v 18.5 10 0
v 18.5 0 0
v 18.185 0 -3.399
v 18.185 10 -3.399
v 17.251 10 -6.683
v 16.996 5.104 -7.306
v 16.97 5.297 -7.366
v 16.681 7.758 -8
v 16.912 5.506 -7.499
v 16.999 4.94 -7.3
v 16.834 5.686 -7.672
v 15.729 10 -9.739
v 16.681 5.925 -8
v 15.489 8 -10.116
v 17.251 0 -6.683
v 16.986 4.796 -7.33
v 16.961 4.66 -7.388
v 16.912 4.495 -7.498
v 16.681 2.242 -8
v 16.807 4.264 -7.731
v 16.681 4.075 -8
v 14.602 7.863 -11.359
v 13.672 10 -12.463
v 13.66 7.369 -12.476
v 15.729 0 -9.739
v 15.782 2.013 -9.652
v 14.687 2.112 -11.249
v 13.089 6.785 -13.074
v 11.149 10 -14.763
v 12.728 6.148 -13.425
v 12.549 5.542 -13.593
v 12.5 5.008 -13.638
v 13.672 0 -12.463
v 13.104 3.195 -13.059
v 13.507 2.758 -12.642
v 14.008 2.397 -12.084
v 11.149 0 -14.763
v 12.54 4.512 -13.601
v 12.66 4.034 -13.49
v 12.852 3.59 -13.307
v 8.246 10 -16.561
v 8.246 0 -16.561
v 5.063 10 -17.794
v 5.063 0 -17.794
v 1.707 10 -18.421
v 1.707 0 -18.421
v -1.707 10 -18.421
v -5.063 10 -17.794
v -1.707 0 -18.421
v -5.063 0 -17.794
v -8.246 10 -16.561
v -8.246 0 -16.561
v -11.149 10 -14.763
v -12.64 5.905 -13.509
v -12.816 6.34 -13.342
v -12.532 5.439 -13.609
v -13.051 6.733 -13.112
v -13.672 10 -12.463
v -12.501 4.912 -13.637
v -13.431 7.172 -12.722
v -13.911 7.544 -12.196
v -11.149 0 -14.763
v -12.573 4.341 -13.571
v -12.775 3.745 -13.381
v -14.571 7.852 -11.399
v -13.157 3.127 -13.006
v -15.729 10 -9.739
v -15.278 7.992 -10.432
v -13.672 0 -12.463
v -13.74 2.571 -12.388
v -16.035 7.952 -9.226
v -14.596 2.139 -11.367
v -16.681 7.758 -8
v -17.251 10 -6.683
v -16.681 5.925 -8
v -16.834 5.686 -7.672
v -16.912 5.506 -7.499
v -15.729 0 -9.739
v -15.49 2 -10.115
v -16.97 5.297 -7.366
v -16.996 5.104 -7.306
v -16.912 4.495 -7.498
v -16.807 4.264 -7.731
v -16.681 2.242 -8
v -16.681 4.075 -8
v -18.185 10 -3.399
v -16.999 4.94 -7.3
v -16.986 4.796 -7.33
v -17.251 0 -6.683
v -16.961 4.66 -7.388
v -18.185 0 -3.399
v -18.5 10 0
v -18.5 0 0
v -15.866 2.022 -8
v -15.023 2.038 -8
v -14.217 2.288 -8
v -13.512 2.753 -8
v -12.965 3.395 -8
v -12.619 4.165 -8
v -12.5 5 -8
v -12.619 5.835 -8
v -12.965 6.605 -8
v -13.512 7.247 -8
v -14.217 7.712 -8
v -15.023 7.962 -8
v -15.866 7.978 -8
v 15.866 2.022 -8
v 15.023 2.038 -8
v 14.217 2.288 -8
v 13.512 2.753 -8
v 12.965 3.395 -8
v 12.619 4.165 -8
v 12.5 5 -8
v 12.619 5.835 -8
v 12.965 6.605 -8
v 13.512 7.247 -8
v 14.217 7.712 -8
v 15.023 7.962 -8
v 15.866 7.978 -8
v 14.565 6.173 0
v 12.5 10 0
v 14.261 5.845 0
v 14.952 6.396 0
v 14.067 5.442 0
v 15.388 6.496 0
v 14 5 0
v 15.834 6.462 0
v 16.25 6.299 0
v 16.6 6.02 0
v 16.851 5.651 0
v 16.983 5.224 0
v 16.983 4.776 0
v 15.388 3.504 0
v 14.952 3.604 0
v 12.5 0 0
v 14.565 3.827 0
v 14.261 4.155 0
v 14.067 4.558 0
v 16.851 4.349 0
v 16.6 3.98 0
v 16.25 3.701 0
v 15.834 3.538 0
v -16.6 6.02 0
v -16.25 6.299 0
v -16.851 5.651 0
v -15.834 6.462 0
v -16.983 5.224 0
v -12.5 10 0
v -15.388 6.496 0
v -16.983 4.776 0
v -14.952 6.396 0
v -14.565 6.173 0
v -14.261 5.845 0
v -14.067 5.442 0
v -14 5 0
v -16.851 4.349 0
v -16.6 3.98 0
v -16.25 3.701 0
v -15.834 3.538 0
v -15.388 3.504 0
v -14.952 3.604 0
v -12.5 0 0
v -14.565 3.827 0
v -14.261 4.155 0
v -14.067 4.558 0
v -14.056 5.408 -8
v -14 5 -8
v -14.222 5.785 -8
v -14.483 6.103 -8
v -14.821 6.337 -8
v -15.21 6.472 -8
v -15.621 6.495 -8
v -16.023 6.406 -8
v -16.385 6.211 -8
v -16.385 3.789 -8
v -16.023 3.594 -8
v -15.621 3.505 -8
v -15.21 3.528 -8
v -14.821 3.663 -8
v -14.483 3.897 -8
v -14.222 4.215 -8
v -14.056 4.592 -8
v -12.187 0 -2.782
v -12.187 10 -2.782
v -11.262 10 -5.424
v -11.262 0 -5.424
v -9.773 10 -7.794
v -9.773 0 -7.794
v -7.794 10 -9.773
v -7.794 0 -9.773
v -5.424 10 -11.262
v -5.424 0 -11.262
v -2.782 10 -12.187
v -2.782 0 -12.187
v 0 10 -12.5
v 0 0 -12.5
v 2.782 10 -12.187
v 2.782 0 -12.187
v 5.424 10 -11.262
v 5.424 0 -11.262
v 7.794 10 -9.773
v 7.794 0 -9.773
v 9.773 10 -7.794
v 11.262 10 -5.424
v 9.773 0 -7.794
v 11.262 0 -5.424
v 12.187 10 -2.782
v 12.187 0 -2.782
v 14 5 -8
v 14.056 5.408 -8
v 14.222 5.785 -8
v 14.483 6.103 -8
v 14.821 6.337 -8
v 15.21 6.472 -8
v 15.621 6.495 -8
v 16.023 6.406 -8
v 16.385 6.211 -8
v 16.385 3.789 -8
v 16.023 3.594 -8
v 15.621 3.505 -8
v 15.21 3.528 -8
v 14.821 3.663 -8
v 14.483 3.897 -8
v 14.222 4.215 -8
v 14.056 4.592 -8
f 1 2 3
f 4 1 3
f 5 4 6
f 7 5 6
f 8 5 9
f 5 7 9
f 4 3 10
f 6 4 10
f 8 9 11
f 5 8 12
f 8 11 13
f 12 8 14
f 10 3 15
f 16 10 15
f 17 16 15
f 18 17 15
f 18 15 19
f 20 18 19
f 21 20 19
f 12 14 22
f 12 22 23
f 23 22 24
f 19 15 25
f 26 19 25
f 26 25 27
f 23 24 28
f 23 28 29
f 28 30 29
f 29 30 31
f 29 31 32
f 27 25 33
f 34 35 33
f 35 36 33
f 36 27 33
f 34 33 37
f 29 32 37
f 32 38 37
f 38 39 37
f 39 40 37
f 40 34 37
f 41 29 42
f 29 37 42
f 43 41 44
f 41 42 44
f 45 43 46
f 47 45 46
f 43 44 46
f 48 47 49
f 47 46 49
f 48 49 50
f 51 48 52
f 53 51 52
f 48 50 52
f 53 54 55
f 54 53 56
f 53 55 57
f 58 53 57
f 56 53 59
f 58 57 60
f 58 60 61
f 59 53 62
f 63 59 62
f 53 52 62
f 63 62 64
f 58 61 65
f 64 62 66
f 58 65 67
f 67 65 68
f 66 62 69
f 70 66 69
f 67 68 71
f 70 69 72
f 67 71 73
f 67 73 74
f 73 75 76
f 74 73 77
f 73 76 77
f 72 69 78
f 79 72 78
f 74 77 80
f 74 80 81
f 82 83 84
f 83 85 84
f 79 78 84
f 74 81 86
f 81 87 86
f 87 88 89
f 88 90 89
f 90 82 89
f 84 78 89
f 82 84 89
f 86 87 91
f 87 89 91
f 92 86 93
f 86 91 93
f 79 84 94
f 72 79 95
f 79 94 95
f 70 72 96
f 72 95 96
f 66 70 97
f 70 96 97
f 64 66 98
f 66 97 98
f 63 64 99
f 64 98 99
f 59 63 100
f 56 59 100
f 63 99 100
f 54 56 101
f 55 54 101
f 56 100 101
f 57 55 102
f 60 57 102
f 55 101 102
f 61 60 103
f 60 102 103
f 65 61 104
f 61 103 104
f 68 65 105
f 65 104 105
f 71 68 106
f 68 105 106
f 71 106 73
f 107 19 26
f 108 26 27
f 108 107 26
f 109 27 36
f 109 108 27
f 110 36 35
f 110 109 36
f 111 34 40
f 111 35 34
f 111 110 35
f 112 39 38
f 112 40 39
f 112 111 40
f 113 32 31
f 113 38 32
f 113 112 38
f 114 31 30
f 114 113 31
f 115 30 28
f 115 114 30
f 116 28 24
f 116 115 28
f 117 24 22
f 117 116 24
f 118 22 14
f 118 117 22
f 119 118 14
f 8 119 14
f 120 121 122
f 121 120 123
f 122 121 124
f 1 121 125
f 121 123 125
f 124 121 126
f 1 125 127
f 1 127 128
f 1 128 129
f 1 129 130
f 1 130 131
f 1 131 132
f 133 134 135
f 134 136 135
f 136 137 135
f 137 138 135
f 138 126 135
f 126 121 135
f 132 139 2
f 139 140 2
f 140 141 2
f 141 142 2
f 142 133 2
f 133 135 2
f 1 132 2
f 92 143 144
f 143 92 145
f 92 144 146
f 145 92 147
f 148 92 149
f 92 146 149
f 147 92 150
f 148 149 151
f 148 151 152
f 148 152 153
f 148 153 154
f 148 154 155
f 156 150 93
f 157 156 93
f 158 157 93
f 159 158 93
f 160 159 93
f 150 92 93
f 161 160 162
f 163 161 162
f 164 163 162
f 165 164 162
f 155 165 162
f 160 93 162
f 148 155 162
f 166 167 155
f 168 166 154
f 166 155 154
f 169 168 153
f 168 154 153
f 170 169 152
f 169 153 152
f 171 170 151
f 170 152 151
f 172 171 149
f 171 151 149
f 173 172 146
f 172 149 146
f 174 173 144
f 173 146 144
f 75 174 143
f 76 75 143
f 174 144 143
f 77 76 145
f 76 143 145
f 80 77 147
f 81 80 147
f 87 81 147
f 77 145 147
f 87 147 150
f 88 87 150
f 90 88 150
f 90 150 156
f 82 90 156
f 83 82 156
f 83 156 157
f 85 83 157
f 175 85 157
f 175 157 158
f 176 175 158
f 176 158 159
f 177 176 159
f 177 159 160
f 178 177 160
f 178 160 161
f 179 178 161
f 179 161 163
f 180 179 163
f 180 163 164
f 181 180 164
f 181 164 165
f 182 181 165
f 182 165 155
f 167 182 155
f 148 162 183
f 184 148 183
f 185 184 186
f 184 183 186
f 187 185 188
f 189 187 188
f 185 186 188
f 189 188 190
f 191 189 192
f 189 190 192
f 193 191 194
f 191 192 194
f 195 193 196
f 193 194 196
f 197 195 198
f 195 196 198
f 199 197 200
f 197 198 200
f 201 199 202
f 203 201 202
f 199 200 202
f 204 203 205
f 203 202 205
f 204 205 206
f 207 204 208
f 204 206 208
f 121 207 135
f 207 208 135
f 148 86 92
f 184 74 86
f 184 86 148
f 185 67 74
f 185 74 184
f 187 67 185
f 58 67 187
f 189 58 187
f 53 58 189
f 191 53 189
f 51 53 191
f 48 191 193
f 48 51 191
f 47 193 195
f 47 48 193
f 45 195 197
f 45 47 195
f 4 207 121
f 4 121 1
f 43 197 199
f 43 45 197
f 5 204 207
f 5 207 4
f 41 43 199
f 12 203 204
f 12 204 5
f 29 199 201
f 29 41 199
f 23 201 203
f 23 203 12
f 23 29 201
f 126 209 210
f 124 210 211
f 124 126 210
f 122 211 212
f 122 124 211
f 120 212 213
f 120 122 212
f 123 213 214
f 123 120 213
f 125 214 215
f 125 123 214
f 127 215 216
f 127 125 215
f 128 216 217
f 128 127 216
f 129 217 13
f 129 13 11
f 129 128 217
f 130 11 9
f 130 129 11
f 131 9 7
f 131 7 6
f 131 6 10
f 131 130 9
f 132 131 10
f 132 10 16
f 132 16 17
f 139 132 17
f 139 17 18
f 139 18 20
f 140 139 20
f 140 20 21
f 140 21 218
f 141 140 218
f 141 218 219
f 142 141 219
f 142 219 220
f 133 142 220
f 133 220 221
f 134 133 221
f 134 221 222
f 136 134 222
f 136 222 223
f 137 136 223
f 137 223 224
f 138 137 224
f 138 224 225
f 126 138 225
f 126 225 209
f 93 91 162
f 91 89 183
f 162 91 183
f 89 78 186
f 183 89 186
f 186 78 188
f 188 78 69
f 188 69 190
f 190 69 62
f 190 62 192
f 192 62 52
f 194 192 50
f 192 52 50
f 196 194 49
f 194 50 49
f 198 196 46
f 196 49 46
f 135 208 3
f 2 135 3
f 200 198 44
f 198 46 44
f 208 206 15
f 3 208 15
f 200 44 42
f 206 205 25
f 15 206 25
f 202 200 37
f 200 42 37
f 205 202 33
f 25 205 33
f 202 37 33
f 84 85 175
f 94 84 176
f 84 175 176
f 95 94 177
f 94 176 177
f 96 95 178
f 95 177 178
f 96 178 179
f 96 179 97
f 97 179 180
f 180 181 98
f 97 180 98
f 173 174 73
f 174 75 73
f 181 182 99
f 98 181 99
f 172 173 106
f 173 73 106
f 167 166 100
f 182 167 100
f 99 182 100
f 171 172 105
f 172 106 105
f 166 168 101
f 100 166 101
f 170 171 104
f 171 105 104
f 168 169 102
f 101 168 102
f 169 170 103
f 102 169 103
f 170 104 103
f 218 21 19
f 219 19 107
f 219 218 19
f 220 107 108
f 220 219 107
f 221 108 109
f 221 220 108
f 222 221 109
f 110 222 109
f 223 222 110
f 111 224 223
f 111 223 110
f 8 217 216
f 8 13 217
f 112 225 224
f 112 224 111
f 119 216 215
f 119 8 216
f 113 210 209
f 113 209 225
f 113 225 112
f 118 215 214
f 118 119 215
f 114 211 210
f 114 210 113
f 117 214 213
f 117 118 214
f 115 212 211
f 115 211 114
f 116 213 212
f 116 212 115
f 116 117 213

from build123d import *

# Parameters (mm, degrees)
BOSS_EXTRUDE1_DEPTH = 10
SKETCH2_R           = 1.5
CUT_EXTRUDE1_DEPTH  = 8
SKETCH3_R           = 3
CUT_EXTRUDE2_DEPTH  = 24.505318713


with BuildPart() as part:
    # Sketch1 → Boss-Extrude1 (new body)
    with BuildSketch(Plane(origin=(0, 0, 0), x_dir=(1, 0, 0), z_dir=(0, 1, 0))):
        with BuildLine():
            ThreePointArc((-12.5, 0), (0, 12.5), (12.5, 0))
            Line((12.5, 0), (18.5, 0))
            ThreePointArc((18.5, 0), (0, 18.5), (-18.5, 0))
            Line((-18.5, 0), (-12.5, 0))
        make_face()
    extrude(amount=BOSS_EXTRUDE1_DEPTH)

    # Sketch2 → Cut-Extrude1 (cut)
    with BuildSketch(Plane.XY):
        with Locations((-15.5, 5)):
            Circle(SKETCH2_R)
    cut_extrude1 = extrude(amount=-CUT_EXTRUDE1_DEPTH, mode=Mode.SUBTRACT)

    # Sketch3 → Cut-Extrude2 (cut, through all)
    with BuildSketch(Plane.XY.offset(-8)):
        with Locations((-15.5, 5)):
            Circle(SKETCH3_R)
    cut_extrude2 = extrude(amount=-CUT_EXTRUDE2_DEPTH, mode=Mode.SUBTRACT)

    # Mirror1: Cut-Extrude1, Cut-Extrude2 across plane
    add(cut_extrude1.mirror(Plane(origin=(0, 0, 0), x_dir=(0, 0, 1), z_dir=(1, 0, 0))), mode=Mode.SUBTRACT)
    add(cut_extrude2.mirror(Plane(origin=(0, 0, 0), x_dir=(0, 0, 1), z_dir=(1, 0, 0))), mode=Mode.SUBTRACT)


solid = part.part
